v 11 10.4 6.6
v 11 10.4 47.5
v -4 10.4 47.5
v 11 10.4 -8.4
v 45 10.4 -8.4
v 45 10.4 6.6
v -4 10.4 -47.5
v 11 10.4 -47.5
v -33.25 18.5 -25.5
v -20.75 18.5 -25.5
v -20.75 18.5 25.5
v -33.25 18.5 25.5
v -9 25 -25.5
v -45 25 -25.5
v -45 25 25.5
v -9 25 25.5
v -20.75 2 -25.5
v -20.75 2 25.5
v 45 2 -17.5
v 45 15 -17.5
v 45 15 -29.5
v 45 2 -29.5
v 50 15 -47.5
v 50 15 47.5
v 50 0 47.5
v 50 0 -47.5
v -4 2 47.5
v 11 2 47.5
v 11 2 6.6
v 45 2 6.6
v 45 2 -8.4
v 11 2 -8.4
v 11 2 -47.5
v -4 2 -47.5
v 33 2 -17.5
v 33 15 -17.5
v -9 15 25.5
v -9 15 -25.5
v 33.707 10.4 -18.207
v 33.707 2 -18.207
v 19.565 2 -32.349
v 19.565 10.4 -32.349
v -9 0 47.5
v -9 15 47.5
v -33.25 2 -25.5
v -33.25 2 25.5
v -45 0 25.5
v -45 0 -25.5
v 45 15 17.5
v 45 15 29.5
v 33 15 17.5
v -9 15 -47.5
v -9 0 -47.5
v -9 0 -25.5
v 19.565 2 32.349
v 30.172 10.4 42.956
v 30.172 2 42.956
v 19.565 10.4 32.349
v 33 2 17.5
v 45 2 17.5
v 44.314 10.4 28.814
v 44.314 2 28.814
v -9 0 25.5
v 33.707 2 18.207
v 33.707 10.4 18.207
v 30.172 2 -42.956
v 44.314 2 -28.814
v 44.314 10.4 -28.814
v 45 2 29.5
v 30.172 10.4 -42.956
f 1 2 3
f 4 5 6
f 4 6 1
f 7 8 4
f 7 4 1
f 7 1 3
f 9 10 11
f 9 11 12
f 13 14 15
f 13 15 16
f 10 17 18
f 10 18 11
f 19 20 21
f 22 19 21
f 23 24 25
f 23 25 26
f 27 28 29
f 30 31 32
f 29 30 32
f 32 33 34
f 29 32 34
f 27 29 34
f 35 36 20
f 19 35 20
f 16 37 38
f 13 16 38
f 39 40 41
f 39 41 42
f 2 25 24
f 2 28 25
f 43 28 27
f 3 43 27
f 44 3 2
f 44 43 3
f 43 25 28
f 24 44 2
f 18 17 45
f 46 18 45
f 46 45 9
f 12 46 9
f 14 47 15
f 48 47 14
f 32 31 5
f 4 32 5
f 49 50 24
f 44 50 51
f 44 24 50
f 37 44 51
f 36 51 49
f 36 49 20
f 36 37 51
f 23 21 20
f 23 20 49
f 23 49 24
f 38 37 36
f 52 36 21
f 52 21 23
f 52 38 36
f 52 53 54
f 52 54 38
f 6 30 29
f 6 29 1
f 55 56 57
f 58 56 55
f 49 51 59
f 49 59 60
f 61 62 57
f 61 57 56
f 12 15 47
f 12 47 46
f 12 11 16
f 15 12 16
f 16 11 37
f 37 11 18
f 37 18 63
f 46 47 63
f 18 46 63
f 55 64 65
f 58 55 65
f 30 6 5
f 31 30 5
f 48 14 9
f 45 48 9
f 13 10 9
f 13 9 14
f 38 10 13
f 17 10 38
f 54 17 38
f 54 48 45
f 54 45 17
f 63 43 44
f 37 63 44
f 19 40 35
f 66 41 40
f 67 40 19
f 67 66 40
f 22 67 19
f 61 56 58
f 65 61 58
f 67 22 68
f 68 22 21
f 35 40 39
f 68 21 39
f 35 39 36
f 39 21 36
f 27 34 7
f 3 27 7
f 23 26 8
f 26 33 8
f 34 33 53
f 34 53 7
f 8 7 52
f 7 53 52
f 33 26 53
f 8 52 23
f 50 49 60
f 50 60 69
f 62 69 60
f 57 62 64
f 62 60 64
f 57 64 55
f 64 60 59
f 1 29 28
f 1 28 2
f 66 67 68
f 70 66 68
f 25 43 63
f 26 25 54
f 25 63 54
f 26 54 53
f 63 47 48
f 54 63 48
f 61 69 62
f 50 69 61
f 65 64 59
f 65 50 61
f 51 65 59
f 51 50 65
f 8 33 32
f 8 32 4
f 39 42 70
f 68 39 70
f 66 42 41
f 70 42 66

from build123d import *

# Parameters (mm, degrees)
SKETCH1_W           = 90
SKETCH1_H           = 95
BOSS_EXTRUDE3_DEPTH = 15
SKETCH5_W           = 15
SKETCH5_H           = 8.4
CUT_EXTRUDE3_DEPTH  = 40
SKETCH7_W           = 95
SKETCH7_H           = 15
BOSS_EXTRUDE4_DEPTH = 5
CUT_EXTRUDE7_DEPTH  = 13
SKETCH12_W          = 15
SKETCH12_H          = 8.4
CUT_EXTRUDE8_DEPTH  = 20
CUT_EXTRUDE9_DEPTH  = 13
SKETCH14_W          = 15
SKETCH14_H          = 8.4
CUT_EXTRUDE11_DEPTH = 20
SKETCH15_W          = 36
SKETCH15_H          = 15
CUT_EXTRUDE12_DEPTH = 22
SKETCH16_W          = 36
SKETCH16_H          = 15
CUT_EXTRUDE13_DEPTH = 22
SKETCH17_W          = 36
SKETCH17_H          = 51
BOSS_EXTRUDE5_DEPTH = 10
SKETCH18_W          = 12.5
SKETCH18_H          = 16.5
CUT_EXTRUDE14_DEPTH = 100
SKETCH19_W          = 15
SKETCH19_H          = 8.4
CUT_EXTRUDE15_DEPTH = 100


with BuildPart() as part:
    # Sketch1 → Boss-Extrude3 (new body)
    with BuildSketch(Plane(origin=(0, 0, 0), x_dir=(1, 0, 0), z_dir=(0, 1, 0))):
        Rectangle(SKETCH1_W, SKETCH1_H)
    extrude(amount=BOSS_EXTRUDE3_DEPTH)

    # Sketch5 → Cut-Extrude3 (cut)
    with BuildSketch(Plane(origin=(45, 0, 0), x_dir=(0, 0, -1), z_dir=(1, 0, 0))):
        with Locations((0.9, 6.2)):
            Rectangle(SKETCH5_W, SKETCH5_H)
    extrude(amount=-CUT_EXTRUDE3_DEPTH, mode=Mode.SUBTRACT)

    # Sketch7 → Boss-Extrude4 (add)
    with BuildSketch(Plane(origin=(45, 0, 0), x_dir=(0, 0, -1), z_dir=(1, 0, 0))):
        with Locations((0, 7.5)):
            Rectangle(SKETCH7_W, SKETCH7_H)
    extrude(amount=BOSS_EXTRUDE4_DEPTH)

    # Sketch10 → Cut-Extrude7 (cut)
    with BuildSketch(Plane(origin=(0, 15, 0), x_dir=(1, 0, 0), z_dir=(0, 1, 0))):
        Polygon((33, -17.5), (45, -17.5), (45, -29.5), align=None)
    extrude(amount=-CUT_EXTRUDE7_DEPTH, mode=Mode.SUBTRACT)

    # Sketch12 → Cut-Extrude8 (cut)
    with BuildSketch(Plane(origin=(7.75, 0, -7.75), x_dir=(-0.707106781, 0, -0.707106781), z_dir=(0.707106781, 0, -0.707106781))):
        with Locations((-44.20889245, 6.2)):
            Rectangle(SKETCH12_W, SKETCH12_H)
    extrude(amount=-CUT_EXTRUDE8_DEPTH, mode=Mode.SUBTRACT)

    # Sketch13 → Cut-Extrude9 (cut)
    with BuildSketch(Plane(origin=(0, 15, 0), x_dir=(1, 0, 0), z_dir=(0, 1, 0))):
        Polygon((33, 17.5), (45, 17.5), (45, 29.5), align=None)
    extrude(amount=-CUT_EXTRUDE9_DEPTH, mode=Mode.SUBTRACT)

    # Sketch14 → Cut-Extrude11 (cut)
    with BuildSketch(Plane(origin=(7.75, 0, 7.75), x_dir=(0.707106781, 0, -0.707106781), z_dir=(0.707106781, 0, 0.707106781))):
        with Locations((44.20889245, 6.2)):
            Rectangle(SKETCH14_W, SKETCH14_H)
    extrude(amount=-CUT_EXTRUDE11_DEPTH, mode=Mode.SUBTRACT)

    # Sketch15 → Cut-Extrude12 (cut)
    with BuildSketch(Plane.XY.offset(47.5)):
        with Locations((-27, 7.5)):
            Rectangle(SKETCH15_W, SKETCH15_H)
    extrude(amount=-CUT_EXTRUDE12_DEPTH, mode=Mode.SUBTRACT)

    # Sketch16 → Cut-Extrude13 (cut)
    with BuildSketch(Plane(origin=(0, 0, -47.5), x_dir=(-1, 0, 0), z_dir=(0, 0, -1))):
        with Locations((27, 7.5)):
            Rectangle(SKETCH16_W, SKETCH16_H)
    extrude(amount=-CUT_EXTRUDE13_DEPTH, mode=Mode.SUBTRACT)

    # Sketch17 → Boss-Extrude5 (add)
    with BuildSketch(Plane(origin=(0, 15, 0), x_dir=(1, 0, 0), z_dir=(0, 1, 0))):
        with Locations((-27, 0)):
            Rectangle(SKETCH17_W, SKETCH17_H)
    extrude(amount=BOSS_EXTRUDE5_DEPTH)

    # Sketch18 → Cut-Extrude14 (cut)
    with BuildSketch(Plane(origin=(0, 0, -25.5), x_dir=(-1, 0, 0), z_dir=(0, 0, -1))):
        with Locations((27, 10.25)):
            Rectangle(SKETCH18_W, SKETCH18_H)
    extrude(amount=-CUT_EXTRUDE14_DEPTH, mode=Mode.SUBTRACT)

    # Sketch19 → Cut-Extrude15 (cut)
    with BuildSketch(Plane(origin=(0, 0, -47.5), x_dir=(-1, 0, 0), z_dir=(0, 0, -1))):
        with Locations((-3.5, 6.2)):
            Rectangle(SKETCH19_W, SKETCH19_H)
    extrude(amount=-CUT_EXTRUDE15_DEPTH, mode=Mode.SUBTRACT)


solid = part.part
